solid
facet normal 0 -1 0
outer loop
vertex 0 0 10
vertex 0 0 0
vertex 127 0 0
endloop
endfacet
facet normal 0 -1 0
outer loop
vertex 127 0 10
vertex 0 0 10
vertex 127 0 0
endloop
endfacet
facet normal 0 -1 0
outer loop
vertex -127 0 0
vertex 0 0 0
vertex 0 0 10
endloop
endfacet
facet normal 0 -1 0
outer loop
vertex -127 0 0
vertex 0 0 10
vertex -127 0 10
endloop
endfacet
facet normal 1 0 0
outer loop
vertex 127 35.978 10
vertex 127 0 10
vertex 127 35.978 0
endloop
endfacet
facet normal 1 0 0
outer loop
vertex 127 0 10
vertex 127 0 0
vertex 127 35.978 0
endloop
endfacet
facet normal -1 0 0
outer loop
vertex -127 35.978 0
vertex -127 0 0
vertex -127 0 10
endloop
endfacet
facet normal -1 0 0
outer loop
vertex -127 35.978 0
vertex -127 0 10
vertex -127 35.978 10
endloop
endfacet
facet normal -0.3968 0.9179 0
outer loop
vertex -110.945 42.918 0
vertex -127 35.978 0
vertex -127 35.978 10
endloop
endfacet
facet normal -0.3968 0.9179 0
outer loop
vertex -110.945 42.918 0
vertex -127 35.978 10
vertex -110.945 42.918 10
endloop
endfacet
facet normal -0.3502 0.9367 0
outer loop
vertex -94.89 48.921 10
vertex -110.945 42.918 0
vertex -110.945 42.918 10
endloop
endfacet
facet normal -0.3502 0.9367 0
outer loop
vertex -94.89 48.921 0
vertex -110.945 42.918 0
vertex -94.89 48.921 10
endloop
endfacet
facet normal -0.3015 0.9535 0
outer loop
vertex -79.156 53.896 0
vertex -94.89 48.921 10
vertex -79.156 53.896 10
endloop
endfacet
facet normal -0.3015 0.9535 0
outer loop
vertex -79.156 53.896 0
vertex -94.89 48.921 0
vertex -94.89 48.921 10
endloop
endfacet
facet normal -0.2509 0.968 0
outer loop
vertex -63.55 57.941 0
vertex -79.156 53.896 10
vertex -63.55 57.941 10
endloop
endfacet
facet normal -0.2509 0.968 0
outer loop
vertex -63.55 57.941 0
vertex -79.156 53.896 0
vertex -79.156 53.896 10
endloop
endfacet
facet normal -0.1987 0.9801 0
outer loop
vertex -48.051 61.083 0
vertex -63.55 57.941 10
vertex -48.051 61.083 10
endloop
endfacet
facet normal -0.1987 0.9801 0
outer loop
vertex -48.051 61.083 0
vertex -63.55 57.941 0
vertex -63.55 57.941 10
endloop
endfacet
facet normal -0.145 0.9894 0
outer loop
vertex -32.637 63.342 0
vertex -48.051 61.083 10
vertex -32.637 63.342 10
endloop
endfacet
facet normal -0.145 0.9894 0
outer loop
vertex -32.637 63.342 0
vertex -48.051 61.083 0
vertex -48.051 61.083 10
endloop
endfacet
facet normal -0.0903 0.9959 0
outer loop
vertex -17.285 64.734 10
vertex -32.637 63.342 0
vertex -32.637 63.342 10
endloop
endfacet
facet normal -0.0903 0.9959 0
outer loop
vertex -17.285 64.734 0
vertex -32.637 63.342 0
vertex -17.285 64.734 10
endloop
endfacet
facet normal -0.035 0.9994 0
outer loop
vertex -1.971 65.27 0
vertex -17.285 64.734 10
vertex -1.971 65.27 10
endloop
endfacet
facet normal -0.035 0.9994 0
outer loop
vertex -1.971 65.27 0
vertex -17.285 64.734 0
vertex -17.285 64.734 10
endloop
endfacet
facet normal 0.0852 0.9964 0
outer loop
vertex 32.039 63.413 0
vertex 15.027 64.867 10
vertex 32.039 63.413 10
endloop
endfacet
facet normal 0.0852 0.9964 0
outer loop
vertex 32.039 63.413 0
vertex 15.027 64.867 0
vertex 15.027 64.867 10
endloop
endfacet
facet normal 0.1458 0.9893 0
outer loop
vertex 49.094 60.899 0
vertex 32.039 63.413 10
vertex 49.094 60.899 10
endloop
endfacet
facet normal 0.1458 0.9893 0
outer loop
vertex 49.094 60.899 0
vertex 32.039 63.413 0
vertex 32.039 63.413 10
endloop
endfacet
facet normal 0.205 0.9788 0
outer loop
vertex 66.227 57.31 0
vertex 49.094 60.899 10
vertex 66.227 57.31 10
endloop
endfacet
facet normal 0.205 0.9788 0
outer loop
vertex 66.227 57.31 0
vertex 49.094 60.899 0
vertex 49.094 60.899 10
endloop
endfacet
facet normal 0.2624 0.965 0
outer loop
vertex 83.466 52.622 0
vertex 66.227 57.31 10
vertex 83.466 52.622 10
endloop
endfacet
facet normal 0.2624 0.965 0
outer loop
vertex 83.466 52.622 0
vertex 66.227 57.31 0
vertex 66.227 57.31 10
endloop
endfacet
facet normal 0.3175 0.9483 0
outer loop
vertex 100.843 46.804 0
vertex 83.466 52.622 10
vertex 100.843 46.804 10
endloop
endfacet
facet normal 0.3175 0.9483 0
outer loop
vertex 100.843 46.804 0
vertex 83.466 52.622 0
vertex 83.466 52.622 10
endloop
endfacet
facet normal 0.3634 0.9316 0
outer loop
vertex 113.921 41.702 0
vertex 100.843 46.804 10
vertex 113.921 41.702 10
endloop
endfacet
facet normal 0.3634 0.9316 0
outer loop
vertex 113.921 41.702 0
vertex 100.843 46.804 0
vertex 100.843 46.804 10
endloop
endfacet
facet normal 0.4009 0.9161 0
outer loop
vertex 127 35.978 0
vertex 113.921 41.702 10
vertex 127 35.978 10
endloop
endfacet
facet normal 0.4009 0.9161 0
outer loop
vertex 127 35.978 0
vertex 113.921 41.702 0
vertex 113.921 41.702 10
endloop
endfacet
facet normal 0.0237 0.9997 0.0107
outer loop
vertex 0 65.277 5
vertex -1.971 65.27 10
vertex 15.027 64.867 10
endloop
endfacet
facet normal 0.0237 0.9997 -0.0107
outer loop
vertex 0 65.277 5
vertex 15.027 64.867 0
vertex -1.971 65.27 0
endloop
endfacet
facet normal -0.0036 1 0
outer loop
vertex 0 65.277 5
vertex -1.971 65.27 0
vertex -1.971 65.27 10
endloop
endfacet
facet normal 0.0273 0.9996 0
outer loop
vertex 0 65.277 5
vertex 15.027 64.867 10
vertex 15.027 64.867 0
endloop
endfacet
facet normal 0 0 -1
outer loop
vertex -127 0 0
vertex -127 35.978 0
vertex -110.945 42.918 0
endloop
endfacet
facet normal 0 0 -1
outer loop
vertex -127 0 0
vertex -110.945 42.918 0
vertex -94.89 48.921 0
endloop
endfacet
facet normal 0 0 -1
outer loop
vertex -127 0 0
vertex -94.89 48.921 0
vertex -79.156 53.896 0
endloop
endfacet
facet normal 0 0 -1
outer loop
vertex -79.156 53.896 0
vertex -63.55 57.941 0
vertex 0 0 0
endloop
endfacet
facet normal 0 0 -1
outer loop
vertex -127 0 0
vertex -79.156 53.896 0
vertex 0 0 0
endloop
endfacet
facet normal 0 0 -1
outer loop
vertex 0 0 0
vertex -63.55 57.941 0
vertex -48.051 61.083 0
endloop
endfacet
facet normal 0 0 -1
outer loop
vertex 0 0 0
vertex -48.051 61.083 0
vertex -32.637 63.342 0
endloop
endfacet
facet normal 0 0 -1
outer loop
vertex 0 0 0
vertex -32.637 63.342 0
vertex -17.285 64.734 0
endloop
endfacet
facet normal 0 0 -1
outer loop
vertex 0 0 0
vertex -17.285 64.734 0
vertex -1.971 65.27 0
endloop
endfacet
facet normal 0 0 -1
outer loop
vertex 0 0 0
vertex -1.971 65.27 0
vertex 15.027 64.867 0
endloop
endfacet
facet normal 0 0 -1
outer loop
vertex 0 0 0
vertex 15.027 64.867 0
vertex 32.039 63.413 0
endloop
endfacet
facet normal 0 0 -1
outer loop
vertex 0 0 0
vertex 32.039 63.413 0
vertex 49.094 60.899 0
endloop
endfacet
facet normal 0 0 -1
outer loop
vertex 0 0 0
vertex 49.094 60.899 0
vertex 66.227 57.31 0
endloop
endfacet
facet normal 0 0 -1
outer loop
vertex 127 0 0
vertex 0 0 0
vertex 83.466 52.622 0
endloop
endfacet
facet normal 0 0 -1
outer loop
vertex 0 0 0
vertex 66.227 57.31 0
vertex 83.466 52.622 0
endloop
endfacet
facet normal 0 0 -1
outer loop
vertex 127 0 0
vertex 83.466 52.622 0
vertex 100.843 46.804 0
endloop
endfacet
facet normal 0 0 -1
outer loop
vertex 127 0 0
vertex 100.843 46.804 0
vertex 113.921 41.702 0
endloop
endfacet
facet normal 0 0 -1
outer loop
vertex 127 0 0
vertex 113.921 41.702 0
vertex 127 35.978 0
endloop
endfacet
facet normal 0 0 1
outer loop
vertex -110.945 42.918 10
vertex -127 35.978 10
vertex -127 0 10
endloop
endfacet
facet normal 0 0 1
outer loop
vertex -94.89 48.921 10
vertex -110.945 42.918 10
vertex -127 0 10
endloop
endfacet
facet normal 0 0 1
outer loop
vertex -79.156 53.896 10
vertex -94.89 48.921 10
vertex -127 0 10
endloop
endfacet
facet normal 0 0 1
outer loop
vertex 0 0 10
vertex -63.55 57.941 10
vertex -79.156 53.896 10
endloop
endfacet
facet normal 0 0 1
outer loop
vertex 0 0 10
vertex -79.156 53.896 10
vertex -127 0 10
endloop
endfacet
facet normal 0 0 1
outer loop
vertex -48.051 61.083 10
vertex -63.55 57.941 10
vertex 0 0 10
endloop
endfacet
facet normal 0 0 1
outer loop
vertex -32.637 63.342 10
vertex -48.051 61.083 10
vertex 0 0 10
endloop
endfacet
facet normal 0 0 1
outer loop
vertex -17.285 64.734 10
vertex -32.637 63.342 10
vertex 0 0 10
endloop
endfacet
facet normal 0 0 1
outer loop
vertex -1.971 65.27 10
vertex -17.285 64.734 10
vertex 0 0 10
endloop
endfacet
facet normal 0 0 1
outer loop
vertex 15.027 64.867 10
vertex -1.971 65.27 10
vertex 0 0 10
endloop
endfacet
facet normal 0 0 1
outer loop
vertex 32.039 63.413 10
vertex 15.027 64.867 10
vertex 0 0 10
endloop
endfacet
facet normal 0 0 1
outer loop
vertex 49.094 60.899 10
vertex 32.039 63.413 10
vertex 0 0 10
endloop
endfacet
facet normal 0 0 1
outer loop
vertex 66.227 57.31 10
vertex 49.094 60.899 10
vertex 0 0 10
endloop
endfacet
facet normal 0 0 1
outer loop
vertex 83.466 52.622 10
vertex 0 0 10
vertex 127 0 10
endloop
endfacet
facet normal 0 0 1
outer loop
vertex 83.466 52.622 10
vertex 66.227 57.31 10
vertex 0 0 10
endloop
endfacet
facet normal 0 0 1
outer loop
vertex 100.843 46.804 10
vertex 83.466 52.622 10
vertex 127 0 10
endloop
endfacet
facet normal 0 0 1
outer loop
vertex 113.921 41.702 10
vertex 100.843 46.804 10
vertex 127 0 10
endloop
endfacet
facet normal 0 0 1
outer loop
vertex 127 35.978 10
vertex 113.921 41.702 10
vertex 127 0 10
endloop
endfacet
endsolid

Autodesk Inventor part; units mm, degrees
ref_plane "YZ Plane" through (0, 0, 0) normal (1, 0, 0) x (0, 1, 0)
ref_plane "XZ Plane" through (0, 0, 0) normal (0, 1, 0) x (-1, 0, 0)
ref_plane "XY Plane" through (0, 0, 0) normal (0, 0, 1) x (1, 0, 0)
sketch "Sketch2" plane through (0, 0, 0) normal (0, 0, 1) x (1, 0, 0)
  line L0 (0, 0) -> (-127, 0)
  line L1 (-127, 0) -> (-127, 35.9784)
  line L2 (0, 0) -> (127, 0)
  line L3 (127, 0) -> (127, 35.9784)
  spline S0 degree 2 poles (-127, 35.9784) (0, 94.576) (127, 35.9784) knots 0 0 0 1 1 1
  point P0 (0, 65.2772)
  dimension "d5" = 127
  dimension "d6" = 127
extrude "Extrusion1" add sketch "Sketch2" along normal blind 10
properties part number "Spar-Bulkhead"
